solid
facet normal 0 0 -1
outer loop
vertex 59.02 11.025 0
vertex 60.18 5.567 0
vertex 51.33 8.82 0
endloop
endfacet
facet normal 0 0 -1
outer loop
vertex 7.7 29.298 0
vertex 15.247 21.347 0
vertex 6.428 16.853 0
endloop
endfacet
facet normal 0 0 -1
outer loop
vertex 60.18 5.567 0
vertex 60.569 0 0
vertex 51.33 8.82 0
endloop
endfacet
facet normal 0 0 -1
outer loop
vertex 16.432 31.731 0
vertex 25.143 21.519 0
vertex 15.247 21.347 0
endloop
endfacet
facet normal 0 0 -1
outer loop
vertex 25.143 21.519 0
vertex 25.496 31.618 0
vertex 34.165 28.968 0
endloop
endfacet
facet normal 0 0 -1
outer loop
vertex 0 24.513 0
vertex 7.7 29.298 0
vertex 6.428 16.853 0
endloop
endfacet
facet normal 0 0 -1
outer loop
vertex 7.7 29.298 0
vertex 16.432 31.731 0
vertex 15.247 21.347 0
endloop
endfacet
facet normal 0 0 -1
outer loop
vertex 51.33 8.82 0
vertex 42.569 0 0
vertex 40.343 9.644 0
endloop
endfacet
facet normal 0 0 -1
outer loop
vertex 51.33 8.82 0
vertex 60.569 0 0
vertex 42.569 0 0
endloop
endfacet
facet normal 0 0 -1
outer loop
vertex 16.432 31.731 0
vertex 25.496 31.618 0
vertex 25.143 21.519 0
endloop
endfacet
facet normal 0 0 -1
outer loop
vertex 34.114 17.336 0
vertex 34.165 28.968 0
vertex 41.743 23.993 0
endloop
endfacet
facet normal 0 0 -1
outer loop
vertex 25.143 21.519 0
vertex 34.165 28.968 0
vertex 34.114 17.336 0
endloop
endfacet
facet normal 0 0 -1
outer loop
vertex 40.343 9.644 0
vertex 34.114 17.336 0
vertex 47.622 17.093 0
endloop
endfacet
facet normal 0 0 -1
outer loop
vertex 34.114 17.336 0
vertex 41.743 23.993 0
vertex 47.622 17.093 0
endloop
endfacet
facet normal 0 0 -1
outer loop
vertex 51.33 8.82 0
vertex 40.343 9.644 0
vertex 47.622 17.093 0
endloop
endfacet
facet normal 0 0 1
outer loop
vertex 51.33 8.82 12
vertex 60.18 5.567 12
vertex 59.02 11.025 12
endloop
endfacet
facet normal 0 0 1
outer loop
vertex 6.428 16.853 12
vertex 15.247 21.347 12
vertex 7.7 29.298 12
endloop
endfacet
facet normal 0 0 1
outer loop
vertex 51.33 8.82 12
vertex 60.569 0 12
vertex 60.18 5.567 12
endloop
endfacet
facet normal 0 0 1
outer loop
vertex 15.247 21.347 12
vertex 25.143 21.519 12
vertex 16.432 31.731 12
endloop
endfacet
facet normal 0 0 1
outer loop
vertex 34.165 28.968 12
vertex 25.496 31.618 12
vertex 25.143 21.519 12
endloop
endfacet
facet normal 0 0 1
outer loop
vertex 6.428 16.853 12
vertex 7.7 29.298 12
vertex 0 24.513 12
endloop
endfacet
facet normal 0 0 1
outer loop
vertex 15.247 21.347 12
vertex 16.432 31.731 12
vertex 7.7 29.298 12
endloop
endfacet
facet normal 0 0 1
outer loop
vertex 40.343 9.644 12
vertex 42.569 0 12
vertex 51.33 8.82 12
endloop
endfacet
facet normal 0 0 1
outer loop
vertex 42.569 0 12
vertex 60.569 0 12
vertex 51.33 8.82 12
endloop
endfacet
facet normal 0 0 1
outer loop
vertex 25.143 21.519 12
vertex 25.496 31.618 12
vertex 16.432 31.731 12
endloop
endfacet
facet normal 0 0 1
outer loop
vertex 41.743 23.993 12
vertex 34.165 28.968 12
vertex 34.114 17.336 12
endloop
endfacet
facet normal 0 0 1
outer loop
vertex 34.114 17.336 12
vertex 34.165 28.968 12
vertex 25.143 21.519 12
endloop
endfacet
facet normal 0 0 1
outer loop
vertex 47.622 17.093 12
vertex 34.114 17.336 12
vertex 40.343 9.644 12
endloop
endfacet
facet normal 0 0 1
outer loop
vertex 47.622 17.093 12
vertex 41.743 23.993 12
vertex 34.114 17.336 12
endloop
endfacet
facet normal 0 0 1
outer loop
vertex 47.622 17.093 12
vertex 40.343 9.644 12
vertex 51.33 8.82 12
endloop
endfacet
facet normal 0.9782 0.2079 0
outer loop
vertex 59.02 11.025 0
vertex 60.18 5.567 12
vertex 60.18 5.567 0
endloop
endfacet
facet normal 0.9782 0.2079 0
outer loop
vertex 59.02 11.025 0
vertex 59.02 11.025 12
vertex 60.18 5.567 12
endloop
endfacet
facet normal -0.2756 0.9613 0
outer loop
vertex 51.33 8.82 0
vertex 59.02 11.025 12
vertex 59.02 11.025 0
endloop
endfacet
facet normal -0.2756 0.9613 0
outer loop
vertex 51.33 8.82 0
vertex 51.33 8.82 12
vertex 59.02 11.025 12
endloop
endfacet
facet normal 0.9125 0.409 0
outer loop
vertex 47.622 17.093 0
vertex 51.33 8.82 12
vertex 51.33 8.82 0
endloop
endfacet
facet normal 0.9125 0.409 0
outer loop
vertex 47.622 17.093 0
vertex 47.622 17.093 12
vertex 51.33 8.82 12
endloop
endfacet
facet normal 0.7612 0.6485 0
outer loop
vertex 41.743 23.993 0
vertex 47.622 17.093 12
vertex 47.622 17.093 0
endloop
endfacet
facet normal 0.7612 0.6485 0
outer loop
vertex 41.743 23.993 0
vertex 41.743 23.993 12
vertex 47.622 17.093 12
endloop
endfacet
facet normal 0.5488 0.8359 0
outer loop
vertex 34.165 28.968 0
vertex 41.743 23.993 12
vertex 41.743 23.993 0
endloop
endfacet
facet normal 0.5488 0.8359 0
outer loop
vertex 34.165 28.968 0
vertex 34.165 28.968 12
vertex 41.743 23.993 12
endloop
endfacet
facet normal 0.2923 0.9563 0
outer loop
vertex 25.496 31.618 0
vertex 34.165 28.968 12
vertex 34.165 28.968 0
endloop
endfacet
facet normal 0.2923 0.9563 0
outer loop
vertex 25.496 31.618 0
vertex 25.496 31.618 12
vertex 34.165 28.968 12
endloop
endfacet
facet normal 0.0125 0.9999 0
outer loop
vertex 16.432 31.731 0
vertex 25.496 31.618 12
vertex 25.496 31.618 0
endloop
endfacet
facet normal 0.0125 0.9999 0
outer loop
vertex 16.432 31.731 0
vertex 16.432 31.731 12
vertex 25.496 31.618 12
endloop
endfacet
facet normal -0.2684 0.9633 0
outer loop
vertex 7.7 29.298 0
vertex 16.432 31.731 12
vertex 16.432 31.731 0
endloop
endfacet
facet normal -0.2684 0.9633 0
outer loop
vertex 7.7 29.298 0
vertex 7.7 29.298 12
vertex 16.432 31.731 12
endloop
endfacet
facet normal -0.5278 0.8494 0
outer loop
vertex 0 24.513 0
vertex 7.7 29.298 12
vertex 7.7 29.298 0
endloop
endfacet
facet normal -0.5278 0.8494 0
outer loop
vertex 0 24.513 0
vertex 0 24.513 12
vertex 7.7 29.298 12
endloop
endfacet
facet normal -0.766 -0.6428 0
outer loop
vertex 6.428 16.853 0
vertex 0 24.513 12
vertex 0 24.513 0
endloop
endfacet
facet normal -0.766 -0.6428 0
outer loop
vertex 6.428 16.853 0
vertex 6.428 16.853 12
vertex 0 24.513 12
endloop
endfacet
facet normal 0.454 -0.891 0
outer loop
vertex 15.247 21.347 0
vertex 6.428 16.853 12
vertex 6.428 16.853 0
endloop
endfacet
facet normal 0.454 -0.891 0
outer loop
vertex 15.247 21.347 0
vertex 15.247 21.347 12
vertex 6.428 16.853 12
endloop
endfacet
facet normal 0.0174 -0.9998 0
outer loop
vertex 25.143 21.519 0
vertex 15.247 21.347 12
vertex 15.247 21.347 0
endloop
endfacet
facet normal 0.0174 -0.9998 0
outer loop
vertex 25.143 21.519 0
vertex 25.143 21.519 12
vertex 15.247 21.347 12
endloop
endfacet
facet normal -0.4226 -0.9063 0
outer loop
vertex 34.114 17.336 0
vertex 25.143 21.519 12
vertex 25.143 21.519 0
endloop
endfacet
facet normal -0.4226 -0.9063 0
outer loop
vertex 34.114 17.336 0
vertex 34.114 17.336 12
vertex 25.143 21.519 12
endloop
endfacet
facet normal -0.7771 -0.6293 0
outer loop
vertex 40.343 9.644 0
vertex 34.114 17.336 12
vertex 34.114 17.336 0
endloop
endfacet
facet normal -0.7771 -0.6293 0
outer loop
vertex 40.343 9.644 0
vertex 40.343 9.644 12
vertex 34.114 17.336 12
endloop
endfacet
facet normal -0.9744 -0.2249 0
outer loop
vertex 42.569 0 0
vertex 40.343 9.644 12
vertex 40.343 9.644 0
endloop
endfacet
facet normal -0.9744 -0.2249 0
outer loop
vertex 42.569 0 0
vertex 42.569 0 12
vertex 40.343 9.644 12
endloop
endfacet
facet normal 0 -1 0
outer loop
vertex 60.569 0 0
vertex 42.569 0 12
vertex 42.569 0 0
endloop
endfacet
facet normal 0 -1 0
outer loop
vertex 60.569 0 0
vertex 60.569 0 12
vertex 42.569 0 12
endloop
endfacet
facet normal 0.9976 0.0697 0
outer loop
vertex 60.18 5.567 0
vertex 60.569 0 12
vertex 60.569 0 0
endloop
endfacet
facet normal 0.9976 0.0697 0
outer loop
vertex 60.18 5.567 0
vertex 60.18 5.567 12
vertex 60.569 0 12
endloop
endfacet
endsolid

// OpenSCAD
$fn = 32;

// ----------------------------------------------------------------------
// Arc stop: segment, 12 mm thick
// ----------------------------------------------------------------------

// --- parameters (mm) ---
profile_height = 12;      // extrusion height
profile_points = 17;      // points of the closed outline

profile = [[60.569, 0], [60.18, 5.567], [59.02, 11.025], [51.33, 8.82], [47.622, 17.093], [41.743, 23.993], [34.165, 28.968], [25.496, 31.618], [16.432, 31.731], [7.7, 29.298], [0, 24.513], [6.428, 16.853], [15.247, 21.347], [25.143, 21.519], [34.114, 17.336], [40.343, 9.644], [42.569, 0]];  // single closed polygon, 17 points, counter clockwise

// --- the one profile operation ---
linear_extrude(height = profile_height) polygon(points = profile);
